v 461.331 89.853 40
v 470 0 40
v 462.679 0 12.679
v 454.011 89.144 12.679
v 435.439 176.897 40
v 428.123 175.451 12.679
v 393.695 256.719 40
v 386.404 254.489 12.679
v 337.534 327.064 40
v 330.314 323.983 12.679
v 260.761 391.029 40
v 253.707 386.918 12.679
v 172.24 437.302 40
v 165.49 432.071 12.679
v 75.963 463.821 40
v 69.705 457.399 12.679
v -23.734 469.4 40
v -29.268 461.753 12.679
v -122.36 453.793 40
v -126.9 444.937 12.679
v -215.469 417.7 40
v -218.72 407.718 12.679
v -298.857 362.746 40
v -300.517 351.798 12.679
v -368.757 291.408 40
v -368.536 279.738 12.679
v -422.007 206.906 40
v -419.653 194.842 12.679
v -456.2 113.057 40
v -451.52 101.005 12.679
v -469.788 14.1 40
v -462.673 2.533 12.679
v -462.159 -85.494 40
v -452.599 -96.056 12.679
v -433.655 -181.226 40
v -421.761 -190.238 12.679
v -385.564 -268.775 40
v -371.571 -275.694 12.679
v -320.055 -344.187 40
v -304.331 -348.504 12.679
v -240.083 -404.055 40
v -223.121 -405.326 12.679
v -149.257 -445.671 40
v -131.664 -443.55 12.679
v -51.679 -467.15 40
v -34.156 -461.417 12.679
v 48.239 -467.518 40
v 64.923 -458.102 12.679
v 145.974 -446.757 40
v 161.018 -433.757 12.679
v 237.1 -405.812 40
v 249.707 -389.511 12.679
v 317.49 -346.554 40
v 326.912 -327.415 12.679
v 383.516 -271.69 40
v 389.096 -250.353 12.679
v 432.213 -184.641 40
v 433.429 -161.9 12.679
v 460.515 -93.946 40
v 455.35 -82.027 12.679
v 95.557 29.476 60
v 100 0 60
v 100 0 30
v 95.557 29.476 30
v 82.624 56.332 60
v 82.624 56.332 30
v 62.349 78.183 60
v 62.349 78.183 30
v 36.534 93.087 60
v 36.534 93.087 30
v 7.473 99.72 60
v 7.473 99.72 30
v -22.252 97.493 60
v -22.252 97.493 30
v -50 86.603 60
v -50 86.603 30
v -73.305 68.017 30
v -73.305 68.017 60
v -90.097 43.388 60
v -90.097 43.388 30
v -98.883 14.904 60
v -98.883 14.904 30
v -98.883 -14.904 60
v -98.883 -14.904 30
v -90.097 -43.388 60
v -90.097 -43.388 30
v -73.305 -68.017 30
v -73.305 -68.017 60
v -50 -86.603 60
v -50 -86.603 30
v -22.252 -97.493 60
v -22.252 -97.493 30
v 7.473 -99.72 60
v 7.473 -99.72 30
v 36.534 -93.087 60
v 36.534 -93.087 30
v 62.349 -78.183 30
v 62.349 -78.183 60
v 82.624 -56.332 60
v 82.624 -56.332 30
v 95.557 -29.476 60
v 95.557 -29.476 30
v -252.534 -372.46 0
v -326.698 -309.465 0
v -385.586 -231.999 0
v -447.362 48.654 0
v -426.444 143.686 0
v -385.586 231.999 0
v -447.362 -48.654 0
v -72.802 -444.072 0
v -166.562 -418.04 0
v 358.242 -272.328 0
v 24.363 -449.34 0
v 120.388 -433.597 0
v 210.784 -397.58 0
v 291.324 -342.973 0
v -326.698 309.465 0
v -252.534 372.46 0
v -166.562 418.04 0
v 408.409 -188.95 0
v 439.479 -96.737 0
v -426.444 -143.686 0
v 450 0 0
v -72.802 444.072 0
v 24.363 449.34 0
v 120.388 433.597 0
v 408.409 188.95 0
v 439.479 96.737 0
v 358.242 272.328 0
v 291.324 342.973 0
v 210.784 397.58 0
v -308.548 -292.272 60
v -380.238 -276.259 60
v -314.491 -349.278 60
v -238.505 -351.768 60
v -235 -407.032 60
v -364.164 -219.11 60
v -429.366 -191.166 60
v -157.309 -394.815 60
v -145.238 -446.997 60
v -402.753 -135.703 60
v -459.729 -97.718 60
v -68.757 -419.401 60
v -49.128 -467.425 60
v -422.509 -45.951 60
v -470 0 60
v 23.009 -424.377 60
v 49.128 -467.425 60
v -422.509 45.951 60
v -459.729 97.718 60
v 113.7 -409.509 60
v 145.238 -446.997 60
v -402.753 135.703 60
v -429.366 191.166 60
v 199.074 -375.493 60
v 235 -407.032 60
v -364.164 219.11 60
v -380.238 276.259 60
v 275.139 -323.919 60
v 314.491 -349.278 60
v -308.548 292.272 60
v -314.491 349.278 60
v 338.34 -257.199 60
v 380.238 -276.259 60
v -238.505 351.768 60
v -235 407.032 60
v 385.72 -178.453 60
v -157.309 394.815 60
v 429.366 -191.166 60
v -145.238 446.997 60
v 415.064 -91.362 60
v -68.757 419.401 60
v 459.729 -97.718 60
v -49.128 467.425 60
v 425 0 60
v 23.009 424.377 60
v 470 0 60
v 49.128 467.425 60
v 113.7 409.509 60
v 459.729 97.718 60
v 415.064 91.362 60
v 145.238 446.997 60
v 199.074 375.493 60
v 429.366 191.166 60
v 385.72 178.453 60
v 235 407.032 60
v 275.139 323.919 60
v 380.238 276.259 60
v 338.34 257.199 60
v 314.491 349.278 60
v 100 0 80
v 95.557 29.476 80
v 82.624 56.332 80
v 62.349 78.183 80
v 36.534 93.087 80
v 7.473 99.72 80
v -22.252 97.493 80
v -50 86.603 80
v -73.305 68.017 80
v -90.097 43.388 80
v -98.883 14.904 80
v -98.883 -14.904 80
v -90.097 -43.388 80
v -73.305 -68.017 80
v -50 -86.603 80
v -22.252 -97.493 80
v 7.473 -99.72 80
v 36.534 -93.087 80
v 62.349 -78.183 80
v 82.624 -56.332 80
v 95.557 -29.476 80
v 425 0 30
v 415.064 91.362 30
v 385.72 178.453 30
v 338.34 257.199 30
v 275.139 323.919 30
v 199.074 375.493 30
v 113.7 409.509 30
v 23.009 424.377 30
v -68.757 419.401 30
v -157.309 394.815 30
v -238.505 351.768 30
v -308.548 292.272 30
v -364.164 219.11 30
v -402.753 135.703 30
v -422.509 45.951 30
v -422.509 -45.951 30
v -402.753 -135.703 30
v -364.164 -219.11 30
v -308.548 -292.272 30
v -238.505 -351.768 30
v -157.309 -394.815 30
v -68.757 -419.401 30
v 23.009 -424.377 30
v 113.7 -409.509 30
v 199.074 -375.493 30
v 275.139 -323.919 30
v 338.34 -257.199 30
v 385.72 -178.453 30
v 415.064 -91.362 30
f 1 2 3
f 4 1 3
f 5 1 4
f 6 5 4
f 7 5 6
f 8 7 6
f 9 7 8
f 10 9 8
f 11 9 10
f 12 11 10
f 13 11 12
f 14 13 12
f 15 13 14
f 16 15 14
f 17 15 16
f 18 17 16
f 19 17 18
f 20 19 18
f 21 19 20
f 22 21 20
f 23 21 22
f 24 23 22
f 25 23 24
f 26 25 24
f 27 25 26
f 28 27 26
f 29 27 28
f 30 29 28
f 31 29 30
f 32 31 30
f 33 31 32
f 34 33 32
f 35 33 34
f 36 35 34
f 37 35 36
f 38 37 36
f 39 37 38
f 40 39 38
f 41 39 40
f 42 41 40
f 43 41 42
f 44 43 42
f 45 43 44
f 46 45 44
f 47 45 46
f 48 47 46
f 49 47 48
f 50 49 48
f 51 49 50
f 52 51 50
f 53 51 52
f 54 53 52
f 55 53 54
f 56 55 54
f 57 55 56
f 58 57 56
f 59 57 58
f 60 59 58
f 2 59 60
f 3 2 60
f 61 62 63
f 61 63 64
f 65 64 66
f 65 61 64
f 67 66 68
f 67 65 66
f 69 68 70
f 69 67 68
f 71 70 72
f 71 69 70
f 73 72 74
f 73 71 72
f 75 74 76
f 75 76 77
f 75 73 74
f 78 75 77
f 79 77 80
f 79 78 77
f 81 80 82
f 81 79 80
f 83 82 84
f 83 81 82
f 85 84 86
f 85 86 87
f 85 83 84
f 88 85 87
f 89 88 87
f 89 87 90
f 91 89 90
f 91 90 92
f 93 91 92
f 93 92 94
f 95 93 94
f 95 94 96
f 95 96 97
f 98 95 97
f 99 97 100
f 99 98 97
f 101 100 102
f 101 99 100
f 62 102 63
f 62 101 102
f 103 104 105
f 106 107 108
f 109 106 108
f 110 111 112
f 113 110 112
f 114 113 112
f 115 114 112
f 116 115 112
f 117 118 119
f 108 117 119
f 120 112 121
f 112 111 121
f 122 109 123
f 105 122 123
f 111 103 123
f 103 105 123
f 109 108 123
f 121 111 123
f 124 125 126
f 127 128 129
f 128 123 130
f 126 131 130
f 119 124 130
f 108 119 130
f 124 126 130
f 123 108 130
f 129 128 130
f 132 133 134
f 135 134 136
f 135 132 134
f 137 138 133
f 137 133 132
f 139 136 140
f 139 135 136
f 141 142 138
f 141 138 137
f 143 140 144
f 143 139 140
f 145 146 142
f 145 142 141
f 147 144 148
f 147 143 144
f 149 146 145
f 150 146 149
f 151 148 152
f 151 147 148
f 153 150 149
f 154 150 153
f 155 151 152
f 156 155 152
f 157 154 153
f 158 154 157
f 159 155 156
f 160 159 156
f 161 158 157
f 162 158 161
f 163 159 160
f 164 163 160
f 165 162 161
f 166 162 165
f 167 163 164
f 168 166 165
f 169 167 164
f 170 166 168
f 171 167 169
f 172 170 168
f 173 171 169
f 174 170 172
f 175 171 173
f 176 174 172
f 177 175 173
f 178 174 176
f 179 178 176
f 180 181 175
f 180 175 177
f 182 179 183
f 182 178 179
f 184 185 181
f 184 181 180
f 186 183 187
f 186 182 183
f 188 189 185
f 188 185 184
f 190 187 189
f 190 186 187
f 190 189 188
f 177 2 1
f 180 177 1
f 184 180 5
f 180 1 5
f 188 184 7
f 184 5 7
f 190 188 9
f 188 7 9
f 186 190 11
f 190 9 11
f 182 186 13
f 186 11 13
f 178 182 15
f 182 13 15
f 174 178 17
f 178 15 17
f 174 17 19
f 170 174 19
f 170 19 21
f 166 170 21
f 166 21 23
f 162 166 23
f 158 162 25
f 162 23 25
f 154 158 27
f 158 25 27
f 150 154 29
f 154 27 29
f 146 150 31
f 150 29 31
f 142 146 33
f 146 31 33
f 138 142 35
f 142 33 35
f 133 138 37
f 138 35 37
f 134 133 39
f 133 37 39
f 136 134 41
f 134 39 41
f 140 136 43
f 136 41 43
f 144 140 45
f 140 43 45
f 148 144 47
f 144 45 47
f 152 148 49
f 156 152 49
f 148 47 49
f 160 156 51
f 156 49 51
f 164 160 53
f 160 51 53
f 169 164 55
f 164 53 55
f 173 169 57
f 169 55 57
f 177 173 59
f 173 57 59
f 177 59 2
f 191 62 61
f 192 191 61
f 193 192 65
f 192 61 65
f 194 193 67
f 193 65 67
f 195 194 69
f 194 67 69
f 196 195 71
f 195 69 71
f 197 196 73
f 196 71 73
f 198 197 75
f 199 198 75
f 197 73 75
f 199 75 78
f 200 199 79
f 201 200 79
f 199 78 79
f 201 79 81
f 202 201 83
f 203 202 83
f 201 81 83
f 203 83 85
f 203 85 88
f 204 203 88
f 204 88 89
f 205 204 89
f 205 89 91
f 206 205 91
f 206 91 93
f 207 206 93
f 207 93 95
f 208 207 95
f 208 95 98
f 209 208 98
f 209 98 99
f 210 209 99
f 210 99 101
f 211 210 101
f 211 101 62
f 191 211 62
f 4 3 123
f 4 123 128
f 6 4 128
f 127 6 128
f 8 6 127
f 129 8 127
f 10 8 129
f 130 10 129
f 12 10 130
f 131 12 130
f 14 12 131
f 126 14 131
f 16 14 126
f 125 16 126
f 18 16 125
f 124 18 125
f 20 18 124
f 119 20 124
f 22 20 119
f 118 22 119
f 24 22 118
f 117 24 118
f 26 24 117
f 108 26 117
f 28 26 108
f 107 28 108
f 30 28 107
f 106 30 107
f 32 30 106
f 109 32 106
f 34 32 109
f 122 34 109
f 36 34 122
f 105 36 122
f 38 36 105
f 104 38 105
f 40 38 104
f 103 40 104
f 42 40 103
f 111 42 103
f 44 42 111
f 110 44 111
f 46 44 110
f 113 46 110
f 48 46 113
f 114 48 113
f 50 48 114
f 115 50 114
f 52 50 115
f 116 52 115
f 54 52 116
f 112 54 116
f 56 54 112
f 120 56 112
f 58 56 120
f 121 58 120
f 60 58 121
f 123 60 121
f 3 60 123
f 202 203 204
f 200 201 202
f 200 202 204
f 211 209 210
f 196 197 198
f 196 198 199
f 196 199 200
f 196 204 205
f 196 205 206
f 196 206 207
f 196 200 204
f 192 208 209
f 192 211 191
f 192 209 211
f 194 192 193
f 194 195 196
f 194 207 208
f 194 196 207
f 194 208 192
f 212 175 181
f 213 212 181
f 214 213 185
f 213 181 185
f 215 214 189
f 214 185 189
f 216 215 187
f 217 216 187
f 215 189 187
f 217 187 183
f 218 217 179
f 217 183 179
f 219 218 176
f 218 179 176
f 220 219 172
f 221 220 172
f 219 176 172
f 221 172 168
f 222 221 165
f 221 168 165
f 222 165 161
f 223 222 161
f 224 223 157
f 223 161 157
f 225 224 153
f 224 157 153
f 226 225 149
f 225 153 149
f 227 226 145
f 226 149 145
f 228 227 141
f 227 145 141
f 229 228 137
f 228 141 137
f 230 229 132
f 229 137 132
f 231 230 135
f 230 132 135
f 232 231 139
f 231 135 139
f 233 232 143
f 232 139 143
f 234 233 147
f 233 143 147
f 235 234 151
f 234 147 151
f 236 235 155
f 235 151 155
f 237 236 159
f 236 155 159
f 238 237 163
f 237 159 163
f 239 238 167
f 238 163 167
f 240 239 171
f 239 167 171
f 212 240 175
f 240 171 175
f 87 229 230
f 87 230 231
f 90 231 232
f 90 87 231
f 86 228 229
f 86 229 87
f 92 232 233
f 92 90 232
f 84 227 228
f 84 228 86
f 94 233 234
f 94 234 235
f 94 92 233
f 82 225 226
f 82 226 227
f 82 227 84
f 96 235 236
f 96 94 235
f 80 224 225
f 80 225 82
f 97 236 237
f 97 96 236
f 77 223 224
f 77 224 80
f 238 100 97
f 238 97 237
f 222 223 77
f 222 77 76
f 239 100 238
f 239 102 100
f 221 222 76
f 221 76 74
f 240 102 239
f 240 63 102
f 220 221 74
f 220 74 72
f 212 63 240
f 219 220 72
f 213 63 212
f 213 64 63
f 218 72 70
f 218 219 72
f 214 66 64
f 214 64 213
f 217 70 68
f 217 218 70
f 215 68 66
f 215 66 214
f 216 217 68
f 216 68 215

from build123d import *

# Parameters (mm, degrees)
SKETCH2_R           = 470
BOSS_EXTRUDE1_DEPTH = 60
BOSS_EXTRUDE2_START = -60
SKETCH3_R           = 100
BOSS_EXTRUDE2_DEPTH = 80
SKETCH4_R           = 425
SKETCH4_R_2         = 100
CUT_EXTRUDE2_DEPTH  = 30
CHAMFER2_SIZE       = 20
CHAMFER8_SIZE       = 20
CHAMFER8_SIZE2      = 10.352761804


with BuildPart() as part:
    # Sketch2 → Boss-Extrude1 (new body)
    with BuildSketch(Plane.XY):
        Circle(SKETCH2_R)
    extrude(amount=BOSS_EXTRUDE1_DEPTH)

    # Sketch3 → Boss-Extrude2 (add)
    with BuildSketch(Plane.XY.offset(60).offset(BOSS_EXTRUDE2_START)):
        Circle(SKETCH3_R)
    extrude(amount=BOSS_EXTRUDE2_DEPTH)

    # Sketch4 → Cut-Extrude2 (cut)
    with BuildSketch(Plane.XY.offset(60)):
        Circle(SKETCH4_R)
        Circle(SKETCH4_R_2, mode=Mode.SUBTRACT)
    extrude(amount=-CUT_EXTRUDE2_DEPTH, mode=Mode.SUBTRACT)

    # Chamfer2
    chamfer2_edges = [part.edges().sort_by_distance(p)[0] for p in [
        (-470, 0, 0),
    ]]
    chamfer(chamfer2_edges, length=CHAMFER2_SIZE)

    # Chamfer8
    chamfer8_edges = [part.edges().sort_by_distance(p)[0] for p in [
        (-470, 0, 20),
    ]]
    chamfer8_side = [part.faces().sort_by_distance(p)[0] for p in [
        (-470, 0, 40),
    ]]
    chamfer(chamfer8_edges, length=CHAMFER8_SIZE, length2=CHAMFER8_SIZE2, reference=chamfer8_side[0])


solid = part.part
